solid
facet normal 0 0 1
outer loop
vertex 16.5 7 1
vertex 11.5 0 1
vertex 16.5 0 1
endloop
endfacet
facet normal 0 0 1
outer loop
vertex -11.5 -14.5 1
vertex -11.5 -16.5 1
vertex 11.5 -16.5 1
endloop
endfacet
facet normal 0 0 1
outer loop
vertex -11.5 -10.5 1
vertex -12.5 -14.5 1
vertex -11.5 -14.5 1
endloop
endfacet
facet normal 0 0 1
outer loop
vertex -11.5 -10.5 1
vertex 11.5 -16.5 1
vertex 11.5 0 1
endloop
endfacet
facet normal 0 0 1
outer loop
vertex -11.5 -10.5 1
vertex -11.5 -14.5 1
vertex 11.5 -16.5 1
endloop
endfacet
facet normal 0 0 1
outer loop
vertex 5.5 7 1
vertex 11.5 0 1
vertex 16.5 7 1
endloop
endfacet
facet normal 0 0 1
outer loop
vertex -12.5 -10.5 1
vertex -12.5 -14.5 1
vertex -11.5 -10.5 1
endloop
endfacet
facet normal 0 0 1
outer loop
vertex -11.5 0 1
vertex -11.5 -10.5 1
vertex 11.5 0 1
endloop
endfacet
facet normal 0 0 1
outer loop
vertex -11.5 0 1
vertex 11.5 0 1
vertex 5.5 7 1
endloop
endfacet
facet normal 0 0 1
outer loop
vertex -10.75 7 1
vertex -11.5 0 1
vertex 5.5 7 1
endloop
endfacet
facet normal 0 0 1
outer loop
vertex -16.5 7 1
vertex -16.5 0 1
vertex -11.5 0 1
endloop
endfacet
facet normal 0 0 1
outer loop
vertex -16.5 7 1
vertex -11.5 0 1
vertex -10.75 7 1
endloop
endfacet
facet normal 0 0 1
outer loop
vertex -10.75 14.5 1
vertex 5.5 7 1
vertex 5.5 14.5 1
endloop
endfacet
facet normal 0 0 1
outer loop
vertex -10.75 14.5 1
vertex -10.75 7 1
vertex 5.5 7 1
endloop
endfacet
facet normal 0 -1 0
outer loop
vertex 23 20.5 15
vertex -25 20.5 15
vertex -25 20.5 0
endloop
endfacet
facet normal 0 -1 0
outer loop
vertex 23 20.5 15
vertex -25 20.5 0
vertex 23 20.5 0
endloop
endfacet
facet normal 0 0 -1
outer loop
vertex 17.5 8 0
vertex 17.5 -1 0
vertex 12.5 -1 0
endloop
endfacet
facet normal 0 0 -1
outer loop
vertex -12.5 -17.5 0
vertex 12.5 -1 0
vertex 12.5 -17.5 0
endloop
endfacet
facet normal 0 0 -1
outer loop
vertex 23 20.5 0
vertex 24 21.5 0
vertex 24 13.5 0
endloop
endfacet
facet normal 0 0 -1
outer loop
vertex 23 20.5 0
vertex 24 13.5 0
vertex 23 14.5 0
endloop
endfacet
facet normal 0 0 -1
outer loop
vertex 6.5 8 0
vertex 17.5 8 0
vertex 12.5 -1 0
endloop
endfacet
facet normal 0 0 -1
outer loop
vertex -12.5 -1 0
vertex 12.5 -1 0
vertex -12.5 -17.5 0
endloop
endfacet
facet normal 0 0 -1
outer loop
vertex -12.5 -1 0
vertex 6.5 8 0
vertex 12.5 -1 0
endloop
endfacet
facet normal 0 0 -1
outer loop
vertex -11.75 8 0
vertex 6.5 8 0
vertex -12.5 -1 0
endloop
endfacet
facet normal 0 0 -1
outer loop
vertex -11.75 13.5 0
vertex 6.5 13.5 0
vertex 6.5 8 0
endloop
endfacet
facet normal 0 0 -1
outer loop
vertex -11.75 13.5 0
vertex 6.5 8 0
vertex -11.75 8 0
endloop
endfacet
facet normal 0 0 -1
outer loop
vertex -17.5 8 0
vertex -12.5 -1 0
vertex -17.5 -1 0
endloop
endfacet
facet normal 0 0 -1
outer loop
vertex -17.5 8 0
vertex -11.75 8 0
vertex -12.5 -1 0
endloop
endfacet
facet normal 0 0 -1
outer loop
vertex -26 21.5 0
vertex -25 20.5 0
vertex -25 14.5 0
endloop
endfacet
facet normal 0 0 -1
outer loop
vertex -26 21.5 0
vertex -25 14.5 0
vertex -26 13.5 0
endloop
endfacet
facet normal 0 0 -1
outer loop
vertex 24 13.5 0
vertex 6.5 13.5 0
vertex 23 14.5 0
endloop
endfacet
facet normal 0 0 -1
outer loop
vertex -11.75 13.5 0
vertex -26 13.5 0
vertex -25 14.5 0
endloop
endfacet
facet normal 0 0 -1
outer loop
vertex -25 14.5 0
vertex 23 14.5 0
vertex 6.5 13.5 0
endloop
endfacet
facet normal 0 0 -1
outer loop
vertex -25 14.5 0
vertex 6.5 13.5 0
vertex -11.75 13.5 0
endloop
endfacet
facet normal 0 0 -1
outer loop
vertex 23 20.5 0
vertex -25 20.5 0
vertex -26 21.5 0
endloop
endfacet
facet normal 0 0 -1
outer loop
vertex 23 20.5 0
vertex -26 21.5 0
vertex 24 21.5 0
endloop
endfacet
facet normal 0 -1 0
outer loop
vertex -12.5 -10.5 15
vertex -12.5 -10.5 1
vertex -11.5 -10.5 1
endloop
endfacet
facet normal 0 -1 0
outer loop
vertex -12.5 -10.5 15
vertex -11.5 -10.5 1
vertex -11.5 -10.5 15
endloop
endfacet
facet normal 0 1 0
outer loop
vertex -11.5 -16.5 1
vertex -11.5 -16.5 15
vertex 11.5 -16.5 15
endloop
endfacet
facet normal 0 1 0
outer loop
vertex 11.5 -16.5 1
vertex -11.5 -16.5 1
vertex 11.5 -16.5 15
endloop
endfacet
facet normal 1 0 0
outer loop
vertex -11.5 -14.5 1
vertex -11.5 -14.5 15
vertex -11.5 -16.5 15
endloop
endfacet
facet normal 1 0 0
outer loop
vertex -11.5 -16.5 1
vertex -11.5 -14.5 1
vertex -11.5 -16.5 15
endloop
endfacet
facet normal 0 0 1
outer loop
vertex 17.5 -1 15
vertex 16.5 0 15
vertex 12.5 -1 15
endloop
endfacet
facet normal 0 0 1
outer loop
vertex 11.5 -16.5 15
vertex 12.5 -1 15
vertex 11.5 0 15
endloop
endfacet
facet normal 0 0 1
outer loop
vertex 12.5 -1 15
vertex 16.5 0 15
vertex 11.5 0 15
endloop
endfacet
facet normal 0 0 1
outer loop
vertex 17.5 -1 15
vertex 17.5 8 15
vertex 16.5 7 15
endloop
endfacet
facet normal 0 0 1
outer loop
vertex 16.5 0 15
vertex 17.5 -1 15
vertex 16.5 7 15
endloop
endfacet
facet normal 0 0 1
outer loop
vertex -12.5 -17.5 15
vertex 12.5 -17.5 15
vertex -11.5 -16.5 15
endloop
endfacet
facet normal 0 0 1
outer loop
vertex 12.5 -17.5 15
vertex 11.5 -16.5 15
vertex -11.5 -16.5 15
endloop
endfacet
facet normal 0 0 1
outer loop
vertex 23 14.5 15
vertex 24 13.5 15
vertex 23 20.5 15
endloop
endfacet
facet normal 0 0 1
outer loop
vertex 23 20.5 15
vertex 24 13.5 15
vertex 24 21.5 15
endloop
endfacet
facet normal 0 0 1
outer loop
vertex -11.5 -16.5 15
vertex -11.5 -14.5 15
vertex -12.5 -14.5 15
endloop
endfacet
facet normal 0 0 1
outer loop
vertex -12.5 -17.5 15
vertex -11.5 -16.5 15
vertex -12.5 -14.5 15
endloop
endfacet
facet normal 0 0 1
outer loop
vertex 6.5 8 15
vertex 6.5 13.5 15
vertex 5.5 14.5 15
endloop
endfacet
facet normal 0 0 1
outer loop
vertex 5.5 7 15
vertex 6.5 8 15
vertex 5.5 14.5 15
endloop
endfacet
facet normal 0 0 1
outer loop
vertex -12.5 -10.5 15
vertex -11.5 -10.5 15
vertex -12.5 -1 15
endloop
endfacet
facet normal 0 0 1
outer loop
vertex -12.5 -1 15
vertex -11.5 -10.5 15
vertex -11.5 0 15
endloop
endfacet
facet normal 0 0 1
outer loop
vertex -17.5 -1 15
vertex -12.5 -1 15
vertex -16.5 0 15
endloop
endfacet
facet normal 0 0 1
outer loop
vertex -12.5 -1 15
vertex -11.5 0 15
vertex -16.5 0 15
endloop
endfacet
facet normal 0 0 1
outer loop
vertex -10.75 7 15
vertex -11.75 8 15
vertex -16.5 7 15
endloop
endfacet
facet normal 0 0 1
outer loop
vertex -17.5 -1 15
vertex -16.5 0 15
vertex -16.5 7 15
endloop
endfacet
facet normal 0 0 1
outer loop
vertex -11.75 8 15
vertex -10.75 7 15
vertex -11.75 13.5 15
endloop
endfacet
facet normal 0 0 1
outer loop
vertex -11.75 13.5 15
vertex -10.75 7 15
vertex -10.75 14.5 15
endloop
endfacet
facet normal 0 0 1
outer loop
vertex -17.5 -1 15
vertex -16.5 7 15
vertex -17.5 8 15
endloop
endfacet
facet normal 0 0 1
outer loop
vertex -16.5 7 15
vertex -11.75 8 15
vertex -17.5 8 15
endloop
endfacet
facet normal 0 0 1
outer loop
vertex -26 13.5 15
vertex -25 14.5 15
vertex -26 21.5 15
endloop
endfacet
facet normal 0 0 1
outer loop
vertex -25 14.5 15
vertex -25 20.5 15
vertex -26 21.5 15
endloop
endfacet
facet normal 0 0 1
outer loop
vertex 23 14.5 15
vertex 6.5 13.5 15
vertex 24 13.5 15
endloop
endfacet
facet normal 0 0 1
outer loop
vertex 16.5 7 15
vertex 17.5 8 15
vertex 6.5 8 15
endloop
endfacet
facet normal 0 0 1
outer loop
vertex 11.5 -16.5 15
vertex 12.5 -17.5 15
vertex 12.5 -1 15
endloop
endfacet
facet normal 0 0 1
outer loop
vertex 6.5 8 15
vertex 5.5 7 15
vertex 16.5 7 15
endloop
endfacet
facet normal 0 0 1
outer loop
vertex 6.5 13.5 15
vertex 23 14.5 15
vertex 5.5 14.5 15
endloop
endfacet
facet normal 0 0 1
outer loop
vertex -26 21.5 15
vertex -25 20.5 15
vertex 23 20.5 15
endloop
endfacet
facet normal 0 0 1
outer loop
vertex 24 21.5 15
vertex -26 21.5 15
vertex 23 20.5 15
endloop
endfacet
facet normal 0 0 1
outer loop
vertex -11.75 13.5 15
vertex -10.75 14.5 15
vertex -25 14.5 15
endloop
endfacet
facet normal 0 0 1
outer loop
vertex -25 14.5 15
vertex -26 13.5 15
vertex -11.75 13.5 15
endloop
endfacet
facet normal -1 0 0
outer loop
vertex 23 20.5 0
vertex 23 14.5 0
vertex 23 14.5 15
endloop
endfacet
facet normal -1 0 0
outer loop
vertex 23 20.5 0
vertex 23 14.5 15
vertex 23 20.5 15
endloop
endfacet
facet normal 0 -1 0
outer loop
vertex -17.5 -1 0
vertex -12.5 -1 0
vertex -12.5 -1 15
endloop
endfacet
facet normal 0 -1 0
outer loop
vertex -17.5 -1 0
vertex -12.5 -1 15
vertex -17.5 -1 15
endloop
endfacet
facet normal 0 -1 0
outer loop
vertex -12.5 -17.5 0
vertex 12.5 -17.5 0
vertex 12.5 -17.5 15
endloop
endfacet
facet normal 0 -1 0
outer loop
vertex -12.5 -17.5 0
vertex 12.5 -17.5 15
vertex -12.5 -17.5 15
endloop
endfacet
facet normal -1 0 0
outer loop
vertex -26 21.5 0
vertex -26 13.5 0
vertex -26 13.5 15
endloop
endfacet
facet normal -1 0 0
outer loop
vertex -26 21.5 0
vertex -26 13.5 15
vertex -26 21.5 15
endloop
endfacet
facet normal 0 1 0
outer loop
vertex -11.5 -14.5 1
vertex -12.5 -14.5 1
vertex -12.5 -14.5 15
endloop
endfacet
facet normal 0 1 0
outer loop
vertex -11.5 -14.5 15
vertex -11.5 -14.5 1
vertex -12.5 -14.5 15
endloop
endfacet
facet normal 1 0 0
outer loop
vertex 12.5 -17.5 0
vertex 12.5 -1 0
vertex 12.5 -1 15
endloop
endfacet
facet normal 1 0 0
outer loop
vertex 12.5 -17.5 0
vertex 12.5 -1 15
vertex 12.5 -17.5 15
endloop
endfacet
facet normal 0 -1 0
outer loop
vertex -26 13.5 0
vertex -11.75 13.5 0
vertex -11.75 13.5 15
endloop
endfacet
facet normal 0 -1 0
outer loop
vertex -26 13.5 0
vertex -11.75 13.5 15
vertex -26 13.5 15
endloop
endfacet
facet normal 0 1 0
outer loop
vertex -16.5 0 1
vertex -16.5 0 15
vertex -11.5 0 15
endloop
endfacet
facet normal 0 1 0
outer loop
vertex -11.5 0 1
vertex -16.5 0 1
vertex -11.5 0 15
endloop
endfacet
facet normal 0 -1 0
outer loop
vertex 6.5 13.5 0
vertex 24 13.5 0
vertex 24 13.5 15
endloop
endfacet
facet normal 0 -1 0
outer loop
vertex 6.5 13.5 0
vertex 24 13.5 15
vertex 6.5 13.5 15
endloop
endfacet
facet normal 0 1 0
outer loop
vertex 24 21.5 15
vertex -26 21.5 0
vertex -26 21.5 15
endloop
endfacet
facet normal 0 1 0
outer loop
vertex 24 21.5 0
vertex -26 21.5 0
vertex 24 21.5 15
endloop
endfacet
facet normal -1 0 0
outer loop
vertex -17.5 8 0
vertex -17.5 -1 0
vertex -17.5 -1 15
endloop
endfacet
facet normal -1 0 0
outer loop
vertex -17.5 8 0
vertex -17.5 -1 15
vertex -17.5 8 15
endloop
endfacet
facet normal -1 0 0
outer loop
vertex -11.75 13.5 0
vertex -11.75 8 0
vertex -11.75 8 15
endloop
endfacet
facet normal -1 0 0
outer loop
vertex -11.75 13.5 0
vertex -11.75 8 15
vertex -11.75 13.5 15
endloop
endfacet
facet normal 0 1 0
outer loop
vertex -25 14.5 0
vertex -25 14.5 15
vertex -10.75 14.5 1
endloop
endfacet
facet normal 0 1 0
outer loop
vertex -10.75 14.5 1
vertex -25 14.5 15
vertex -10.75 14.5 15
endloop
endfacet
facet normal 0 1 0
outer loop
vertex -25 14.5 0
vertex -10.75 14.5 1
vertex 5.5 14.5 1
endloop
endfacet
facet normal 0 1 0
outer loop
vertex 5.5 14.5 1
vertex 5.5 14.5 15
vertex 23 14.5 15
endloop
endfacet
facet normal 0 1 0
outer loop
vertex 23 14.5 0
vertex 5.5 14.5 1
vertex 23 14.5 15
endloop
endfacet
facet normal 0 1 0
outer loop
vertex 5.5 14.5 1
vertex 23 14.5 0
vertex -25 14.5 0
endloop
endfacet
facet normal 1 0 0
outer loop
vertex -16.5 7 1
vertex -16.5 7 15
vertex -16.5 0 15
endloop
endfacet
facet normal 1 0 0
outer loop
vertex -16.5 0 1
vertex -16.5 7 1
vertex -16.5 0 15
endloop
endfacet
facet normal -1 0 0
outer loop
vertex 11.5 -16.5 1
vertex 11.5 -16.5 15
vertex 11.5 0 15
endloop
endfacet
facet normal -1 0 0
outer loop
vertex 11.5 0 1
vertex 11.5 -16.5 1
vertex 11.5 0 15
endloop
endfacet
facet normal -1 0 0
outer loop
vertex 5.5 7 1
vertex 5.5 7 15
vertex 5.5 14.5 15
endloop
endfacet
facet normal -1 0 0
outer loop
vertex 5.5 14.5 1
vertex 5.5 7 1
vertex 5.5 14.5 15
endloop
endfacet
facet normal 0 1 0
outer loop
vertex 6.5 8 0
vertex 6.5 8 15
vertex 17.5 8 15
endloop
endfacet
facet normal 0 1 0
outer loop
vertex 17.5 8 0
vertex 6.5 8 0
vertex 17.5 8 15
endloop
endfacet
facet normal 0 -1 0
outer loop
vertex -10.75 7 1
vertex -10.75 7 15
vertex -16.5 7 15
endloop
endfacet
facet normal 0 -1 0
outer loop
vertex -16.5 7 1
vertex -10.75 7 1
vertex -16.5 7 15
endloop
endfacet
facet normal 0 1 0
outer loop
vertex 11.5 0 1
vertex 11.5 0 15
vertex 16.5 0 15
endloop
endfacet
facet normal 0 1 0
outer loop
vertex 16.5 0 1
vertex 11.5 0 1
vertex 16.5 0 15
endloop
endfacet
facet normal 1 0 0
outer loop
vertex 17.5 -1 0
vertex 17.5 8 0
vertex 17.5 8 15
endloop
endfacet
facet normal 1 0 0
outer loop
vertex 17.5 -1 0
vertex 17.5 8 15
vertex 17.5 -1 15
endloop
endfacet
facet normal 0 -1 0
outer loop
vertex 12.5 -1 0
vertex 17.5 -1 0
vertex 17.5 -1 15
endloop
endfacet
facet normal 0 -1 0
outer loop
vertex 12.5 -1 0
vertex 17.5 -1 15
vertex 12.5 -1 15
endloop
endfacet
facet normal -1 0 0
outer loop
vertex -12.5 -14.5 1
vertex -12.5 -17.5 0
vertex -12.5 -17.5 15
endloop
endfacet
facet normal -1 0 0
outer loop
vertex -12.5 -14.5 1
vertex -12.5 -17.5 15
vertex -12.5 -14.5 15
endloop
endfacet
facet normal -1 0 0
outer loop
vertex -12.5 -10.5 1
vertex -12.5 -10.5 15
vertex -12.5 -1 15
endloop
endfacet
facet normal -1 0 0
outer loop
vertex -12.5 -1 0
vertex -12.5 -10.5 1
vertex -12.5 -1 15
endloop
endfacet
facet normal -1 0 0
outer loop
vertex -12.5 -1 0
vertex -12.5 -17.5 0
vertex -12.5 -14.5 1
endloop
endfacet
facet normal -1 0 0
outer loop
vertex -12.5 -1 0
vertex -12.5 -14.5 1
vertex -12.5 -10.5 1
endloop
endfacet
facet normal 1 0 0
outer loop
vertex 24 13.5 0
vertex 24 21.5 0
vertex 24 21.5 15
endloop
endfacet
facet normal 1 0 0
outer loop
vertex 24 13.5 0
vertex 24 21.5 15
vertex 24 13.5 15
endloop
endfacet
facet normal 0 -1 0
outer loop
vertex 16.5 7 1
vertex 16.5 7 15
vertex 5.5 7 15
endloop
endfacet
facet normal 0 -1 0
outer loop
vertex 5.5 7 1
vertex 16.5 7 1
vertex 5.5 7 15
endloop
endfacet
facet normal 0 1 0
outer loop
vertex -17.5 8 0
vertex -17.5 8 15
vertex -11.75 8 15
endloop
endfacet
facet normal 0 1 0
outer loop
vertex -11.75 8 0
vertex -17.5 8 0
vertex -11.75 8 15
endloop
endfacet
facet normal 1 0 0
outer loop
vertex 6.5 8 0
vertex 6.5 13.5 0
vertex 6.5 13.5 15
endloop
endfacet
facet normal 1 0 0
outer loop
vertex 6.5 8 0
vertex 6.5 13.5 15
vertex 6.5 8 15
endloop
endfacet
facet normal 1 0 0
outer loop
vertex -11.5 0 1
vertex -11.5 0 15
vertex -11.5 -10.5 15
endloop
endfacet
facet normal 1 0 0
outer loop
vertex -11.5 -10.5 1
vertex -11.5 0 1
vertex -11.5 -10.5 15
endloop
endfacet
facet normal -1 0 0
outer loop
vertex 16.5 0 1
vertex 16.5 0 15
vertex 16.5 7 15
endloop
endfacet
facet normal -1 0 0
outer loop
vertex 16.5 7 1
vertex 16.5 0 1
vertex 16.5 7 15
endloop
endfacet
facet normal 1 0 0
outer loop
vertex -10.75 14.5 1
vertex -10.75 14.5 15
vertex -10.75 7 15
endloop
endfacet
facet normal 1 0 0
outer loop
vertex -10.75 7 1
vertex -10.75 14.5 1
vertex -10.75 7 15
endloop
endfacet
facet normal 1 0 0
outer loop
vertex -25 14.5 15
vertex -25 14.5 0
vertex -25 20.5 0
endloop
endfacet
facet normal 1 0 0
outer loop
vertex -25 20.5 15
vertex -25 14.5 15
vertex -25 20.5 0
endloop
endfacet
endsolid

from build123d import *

# Parameters (mm, degrees)
EXTRUDE_1_DEPTH     = 15
CUT_EXTRUDE_1_DEPTH = 14
SKETCH_7_W          = 48
SKETCH_7_H          = 6
CUT_EXTRUDE_2_DEPTH = 1
SKETCH_8_W          = 14
SKETCH_8_H          = 4
CUT_EXTRUDE_3_DEPTH = 1


with BuildPart() as part:
    # 草图3 → 凸台-拉伸1 (new body)
    with BuildSketch(Plane.XY):
        Polygon((-26, 21.5), (24, 21.5), (24, 13.5), (6.5, 13.5), (6.5, 8), (17.5, 8), (17.5, -1), (12.5, -1), (12.5, -17.5), (-12.5, -17.5), (-12.5, -1), (-17.5, -1), (-17.5, 8), (-11.75, 8), (-11.75, 13.5), (-26, 13.5), align=None)
    extrude(amount=EXTRUDE_1_DEPTH)

    # 草图4 → 切除-拉伸1 (cut)
    with BuildSketch(Plane.XY.offset(15)):
        Polygon((23, 20.5), (-25, 20.5), (-25, 14.5), (-10.75, 14.5), (-10.75, 7), (-16.5, 7), (-16.5, 0), (-11.5, 0), (-11.5, -16.5), (11.5, -16.5), (11.5, 0), (16.5, 0), (16.5, 7), (5.5, 7), (5.5, 14.5), (23, 14.5), align=None)
    extrude(amount=-CUT_EXTRUDE_1_DEPTH, mode=Mode.SUBTRACT)

    # 草图7 → 切除-拉伸2 (cut)
    with BuildSketch(Plane.XY.offset(1)):
        with Locations((-1, 17.5)):
            Rectangle(SKETCH_7_W, SKETCH_7_H)
    extrude(amount=-CUT_EXTRUDE_2_DEPTH, mode=Mode.SUBTRACT)

    # 草图8 → 切除-拉伸3 (cut)
    with BuildSketch(Plane.ZY.offset(12.5)):
        with Locations((8, -12.5)):
            Rectangle(SKETCH_8_W, SKETCH_8_H)
    extrude(amount=-CUT_EXTRUDE_3_DEPTH, mode=Mode.SUBTRACT)


solid = part.part
